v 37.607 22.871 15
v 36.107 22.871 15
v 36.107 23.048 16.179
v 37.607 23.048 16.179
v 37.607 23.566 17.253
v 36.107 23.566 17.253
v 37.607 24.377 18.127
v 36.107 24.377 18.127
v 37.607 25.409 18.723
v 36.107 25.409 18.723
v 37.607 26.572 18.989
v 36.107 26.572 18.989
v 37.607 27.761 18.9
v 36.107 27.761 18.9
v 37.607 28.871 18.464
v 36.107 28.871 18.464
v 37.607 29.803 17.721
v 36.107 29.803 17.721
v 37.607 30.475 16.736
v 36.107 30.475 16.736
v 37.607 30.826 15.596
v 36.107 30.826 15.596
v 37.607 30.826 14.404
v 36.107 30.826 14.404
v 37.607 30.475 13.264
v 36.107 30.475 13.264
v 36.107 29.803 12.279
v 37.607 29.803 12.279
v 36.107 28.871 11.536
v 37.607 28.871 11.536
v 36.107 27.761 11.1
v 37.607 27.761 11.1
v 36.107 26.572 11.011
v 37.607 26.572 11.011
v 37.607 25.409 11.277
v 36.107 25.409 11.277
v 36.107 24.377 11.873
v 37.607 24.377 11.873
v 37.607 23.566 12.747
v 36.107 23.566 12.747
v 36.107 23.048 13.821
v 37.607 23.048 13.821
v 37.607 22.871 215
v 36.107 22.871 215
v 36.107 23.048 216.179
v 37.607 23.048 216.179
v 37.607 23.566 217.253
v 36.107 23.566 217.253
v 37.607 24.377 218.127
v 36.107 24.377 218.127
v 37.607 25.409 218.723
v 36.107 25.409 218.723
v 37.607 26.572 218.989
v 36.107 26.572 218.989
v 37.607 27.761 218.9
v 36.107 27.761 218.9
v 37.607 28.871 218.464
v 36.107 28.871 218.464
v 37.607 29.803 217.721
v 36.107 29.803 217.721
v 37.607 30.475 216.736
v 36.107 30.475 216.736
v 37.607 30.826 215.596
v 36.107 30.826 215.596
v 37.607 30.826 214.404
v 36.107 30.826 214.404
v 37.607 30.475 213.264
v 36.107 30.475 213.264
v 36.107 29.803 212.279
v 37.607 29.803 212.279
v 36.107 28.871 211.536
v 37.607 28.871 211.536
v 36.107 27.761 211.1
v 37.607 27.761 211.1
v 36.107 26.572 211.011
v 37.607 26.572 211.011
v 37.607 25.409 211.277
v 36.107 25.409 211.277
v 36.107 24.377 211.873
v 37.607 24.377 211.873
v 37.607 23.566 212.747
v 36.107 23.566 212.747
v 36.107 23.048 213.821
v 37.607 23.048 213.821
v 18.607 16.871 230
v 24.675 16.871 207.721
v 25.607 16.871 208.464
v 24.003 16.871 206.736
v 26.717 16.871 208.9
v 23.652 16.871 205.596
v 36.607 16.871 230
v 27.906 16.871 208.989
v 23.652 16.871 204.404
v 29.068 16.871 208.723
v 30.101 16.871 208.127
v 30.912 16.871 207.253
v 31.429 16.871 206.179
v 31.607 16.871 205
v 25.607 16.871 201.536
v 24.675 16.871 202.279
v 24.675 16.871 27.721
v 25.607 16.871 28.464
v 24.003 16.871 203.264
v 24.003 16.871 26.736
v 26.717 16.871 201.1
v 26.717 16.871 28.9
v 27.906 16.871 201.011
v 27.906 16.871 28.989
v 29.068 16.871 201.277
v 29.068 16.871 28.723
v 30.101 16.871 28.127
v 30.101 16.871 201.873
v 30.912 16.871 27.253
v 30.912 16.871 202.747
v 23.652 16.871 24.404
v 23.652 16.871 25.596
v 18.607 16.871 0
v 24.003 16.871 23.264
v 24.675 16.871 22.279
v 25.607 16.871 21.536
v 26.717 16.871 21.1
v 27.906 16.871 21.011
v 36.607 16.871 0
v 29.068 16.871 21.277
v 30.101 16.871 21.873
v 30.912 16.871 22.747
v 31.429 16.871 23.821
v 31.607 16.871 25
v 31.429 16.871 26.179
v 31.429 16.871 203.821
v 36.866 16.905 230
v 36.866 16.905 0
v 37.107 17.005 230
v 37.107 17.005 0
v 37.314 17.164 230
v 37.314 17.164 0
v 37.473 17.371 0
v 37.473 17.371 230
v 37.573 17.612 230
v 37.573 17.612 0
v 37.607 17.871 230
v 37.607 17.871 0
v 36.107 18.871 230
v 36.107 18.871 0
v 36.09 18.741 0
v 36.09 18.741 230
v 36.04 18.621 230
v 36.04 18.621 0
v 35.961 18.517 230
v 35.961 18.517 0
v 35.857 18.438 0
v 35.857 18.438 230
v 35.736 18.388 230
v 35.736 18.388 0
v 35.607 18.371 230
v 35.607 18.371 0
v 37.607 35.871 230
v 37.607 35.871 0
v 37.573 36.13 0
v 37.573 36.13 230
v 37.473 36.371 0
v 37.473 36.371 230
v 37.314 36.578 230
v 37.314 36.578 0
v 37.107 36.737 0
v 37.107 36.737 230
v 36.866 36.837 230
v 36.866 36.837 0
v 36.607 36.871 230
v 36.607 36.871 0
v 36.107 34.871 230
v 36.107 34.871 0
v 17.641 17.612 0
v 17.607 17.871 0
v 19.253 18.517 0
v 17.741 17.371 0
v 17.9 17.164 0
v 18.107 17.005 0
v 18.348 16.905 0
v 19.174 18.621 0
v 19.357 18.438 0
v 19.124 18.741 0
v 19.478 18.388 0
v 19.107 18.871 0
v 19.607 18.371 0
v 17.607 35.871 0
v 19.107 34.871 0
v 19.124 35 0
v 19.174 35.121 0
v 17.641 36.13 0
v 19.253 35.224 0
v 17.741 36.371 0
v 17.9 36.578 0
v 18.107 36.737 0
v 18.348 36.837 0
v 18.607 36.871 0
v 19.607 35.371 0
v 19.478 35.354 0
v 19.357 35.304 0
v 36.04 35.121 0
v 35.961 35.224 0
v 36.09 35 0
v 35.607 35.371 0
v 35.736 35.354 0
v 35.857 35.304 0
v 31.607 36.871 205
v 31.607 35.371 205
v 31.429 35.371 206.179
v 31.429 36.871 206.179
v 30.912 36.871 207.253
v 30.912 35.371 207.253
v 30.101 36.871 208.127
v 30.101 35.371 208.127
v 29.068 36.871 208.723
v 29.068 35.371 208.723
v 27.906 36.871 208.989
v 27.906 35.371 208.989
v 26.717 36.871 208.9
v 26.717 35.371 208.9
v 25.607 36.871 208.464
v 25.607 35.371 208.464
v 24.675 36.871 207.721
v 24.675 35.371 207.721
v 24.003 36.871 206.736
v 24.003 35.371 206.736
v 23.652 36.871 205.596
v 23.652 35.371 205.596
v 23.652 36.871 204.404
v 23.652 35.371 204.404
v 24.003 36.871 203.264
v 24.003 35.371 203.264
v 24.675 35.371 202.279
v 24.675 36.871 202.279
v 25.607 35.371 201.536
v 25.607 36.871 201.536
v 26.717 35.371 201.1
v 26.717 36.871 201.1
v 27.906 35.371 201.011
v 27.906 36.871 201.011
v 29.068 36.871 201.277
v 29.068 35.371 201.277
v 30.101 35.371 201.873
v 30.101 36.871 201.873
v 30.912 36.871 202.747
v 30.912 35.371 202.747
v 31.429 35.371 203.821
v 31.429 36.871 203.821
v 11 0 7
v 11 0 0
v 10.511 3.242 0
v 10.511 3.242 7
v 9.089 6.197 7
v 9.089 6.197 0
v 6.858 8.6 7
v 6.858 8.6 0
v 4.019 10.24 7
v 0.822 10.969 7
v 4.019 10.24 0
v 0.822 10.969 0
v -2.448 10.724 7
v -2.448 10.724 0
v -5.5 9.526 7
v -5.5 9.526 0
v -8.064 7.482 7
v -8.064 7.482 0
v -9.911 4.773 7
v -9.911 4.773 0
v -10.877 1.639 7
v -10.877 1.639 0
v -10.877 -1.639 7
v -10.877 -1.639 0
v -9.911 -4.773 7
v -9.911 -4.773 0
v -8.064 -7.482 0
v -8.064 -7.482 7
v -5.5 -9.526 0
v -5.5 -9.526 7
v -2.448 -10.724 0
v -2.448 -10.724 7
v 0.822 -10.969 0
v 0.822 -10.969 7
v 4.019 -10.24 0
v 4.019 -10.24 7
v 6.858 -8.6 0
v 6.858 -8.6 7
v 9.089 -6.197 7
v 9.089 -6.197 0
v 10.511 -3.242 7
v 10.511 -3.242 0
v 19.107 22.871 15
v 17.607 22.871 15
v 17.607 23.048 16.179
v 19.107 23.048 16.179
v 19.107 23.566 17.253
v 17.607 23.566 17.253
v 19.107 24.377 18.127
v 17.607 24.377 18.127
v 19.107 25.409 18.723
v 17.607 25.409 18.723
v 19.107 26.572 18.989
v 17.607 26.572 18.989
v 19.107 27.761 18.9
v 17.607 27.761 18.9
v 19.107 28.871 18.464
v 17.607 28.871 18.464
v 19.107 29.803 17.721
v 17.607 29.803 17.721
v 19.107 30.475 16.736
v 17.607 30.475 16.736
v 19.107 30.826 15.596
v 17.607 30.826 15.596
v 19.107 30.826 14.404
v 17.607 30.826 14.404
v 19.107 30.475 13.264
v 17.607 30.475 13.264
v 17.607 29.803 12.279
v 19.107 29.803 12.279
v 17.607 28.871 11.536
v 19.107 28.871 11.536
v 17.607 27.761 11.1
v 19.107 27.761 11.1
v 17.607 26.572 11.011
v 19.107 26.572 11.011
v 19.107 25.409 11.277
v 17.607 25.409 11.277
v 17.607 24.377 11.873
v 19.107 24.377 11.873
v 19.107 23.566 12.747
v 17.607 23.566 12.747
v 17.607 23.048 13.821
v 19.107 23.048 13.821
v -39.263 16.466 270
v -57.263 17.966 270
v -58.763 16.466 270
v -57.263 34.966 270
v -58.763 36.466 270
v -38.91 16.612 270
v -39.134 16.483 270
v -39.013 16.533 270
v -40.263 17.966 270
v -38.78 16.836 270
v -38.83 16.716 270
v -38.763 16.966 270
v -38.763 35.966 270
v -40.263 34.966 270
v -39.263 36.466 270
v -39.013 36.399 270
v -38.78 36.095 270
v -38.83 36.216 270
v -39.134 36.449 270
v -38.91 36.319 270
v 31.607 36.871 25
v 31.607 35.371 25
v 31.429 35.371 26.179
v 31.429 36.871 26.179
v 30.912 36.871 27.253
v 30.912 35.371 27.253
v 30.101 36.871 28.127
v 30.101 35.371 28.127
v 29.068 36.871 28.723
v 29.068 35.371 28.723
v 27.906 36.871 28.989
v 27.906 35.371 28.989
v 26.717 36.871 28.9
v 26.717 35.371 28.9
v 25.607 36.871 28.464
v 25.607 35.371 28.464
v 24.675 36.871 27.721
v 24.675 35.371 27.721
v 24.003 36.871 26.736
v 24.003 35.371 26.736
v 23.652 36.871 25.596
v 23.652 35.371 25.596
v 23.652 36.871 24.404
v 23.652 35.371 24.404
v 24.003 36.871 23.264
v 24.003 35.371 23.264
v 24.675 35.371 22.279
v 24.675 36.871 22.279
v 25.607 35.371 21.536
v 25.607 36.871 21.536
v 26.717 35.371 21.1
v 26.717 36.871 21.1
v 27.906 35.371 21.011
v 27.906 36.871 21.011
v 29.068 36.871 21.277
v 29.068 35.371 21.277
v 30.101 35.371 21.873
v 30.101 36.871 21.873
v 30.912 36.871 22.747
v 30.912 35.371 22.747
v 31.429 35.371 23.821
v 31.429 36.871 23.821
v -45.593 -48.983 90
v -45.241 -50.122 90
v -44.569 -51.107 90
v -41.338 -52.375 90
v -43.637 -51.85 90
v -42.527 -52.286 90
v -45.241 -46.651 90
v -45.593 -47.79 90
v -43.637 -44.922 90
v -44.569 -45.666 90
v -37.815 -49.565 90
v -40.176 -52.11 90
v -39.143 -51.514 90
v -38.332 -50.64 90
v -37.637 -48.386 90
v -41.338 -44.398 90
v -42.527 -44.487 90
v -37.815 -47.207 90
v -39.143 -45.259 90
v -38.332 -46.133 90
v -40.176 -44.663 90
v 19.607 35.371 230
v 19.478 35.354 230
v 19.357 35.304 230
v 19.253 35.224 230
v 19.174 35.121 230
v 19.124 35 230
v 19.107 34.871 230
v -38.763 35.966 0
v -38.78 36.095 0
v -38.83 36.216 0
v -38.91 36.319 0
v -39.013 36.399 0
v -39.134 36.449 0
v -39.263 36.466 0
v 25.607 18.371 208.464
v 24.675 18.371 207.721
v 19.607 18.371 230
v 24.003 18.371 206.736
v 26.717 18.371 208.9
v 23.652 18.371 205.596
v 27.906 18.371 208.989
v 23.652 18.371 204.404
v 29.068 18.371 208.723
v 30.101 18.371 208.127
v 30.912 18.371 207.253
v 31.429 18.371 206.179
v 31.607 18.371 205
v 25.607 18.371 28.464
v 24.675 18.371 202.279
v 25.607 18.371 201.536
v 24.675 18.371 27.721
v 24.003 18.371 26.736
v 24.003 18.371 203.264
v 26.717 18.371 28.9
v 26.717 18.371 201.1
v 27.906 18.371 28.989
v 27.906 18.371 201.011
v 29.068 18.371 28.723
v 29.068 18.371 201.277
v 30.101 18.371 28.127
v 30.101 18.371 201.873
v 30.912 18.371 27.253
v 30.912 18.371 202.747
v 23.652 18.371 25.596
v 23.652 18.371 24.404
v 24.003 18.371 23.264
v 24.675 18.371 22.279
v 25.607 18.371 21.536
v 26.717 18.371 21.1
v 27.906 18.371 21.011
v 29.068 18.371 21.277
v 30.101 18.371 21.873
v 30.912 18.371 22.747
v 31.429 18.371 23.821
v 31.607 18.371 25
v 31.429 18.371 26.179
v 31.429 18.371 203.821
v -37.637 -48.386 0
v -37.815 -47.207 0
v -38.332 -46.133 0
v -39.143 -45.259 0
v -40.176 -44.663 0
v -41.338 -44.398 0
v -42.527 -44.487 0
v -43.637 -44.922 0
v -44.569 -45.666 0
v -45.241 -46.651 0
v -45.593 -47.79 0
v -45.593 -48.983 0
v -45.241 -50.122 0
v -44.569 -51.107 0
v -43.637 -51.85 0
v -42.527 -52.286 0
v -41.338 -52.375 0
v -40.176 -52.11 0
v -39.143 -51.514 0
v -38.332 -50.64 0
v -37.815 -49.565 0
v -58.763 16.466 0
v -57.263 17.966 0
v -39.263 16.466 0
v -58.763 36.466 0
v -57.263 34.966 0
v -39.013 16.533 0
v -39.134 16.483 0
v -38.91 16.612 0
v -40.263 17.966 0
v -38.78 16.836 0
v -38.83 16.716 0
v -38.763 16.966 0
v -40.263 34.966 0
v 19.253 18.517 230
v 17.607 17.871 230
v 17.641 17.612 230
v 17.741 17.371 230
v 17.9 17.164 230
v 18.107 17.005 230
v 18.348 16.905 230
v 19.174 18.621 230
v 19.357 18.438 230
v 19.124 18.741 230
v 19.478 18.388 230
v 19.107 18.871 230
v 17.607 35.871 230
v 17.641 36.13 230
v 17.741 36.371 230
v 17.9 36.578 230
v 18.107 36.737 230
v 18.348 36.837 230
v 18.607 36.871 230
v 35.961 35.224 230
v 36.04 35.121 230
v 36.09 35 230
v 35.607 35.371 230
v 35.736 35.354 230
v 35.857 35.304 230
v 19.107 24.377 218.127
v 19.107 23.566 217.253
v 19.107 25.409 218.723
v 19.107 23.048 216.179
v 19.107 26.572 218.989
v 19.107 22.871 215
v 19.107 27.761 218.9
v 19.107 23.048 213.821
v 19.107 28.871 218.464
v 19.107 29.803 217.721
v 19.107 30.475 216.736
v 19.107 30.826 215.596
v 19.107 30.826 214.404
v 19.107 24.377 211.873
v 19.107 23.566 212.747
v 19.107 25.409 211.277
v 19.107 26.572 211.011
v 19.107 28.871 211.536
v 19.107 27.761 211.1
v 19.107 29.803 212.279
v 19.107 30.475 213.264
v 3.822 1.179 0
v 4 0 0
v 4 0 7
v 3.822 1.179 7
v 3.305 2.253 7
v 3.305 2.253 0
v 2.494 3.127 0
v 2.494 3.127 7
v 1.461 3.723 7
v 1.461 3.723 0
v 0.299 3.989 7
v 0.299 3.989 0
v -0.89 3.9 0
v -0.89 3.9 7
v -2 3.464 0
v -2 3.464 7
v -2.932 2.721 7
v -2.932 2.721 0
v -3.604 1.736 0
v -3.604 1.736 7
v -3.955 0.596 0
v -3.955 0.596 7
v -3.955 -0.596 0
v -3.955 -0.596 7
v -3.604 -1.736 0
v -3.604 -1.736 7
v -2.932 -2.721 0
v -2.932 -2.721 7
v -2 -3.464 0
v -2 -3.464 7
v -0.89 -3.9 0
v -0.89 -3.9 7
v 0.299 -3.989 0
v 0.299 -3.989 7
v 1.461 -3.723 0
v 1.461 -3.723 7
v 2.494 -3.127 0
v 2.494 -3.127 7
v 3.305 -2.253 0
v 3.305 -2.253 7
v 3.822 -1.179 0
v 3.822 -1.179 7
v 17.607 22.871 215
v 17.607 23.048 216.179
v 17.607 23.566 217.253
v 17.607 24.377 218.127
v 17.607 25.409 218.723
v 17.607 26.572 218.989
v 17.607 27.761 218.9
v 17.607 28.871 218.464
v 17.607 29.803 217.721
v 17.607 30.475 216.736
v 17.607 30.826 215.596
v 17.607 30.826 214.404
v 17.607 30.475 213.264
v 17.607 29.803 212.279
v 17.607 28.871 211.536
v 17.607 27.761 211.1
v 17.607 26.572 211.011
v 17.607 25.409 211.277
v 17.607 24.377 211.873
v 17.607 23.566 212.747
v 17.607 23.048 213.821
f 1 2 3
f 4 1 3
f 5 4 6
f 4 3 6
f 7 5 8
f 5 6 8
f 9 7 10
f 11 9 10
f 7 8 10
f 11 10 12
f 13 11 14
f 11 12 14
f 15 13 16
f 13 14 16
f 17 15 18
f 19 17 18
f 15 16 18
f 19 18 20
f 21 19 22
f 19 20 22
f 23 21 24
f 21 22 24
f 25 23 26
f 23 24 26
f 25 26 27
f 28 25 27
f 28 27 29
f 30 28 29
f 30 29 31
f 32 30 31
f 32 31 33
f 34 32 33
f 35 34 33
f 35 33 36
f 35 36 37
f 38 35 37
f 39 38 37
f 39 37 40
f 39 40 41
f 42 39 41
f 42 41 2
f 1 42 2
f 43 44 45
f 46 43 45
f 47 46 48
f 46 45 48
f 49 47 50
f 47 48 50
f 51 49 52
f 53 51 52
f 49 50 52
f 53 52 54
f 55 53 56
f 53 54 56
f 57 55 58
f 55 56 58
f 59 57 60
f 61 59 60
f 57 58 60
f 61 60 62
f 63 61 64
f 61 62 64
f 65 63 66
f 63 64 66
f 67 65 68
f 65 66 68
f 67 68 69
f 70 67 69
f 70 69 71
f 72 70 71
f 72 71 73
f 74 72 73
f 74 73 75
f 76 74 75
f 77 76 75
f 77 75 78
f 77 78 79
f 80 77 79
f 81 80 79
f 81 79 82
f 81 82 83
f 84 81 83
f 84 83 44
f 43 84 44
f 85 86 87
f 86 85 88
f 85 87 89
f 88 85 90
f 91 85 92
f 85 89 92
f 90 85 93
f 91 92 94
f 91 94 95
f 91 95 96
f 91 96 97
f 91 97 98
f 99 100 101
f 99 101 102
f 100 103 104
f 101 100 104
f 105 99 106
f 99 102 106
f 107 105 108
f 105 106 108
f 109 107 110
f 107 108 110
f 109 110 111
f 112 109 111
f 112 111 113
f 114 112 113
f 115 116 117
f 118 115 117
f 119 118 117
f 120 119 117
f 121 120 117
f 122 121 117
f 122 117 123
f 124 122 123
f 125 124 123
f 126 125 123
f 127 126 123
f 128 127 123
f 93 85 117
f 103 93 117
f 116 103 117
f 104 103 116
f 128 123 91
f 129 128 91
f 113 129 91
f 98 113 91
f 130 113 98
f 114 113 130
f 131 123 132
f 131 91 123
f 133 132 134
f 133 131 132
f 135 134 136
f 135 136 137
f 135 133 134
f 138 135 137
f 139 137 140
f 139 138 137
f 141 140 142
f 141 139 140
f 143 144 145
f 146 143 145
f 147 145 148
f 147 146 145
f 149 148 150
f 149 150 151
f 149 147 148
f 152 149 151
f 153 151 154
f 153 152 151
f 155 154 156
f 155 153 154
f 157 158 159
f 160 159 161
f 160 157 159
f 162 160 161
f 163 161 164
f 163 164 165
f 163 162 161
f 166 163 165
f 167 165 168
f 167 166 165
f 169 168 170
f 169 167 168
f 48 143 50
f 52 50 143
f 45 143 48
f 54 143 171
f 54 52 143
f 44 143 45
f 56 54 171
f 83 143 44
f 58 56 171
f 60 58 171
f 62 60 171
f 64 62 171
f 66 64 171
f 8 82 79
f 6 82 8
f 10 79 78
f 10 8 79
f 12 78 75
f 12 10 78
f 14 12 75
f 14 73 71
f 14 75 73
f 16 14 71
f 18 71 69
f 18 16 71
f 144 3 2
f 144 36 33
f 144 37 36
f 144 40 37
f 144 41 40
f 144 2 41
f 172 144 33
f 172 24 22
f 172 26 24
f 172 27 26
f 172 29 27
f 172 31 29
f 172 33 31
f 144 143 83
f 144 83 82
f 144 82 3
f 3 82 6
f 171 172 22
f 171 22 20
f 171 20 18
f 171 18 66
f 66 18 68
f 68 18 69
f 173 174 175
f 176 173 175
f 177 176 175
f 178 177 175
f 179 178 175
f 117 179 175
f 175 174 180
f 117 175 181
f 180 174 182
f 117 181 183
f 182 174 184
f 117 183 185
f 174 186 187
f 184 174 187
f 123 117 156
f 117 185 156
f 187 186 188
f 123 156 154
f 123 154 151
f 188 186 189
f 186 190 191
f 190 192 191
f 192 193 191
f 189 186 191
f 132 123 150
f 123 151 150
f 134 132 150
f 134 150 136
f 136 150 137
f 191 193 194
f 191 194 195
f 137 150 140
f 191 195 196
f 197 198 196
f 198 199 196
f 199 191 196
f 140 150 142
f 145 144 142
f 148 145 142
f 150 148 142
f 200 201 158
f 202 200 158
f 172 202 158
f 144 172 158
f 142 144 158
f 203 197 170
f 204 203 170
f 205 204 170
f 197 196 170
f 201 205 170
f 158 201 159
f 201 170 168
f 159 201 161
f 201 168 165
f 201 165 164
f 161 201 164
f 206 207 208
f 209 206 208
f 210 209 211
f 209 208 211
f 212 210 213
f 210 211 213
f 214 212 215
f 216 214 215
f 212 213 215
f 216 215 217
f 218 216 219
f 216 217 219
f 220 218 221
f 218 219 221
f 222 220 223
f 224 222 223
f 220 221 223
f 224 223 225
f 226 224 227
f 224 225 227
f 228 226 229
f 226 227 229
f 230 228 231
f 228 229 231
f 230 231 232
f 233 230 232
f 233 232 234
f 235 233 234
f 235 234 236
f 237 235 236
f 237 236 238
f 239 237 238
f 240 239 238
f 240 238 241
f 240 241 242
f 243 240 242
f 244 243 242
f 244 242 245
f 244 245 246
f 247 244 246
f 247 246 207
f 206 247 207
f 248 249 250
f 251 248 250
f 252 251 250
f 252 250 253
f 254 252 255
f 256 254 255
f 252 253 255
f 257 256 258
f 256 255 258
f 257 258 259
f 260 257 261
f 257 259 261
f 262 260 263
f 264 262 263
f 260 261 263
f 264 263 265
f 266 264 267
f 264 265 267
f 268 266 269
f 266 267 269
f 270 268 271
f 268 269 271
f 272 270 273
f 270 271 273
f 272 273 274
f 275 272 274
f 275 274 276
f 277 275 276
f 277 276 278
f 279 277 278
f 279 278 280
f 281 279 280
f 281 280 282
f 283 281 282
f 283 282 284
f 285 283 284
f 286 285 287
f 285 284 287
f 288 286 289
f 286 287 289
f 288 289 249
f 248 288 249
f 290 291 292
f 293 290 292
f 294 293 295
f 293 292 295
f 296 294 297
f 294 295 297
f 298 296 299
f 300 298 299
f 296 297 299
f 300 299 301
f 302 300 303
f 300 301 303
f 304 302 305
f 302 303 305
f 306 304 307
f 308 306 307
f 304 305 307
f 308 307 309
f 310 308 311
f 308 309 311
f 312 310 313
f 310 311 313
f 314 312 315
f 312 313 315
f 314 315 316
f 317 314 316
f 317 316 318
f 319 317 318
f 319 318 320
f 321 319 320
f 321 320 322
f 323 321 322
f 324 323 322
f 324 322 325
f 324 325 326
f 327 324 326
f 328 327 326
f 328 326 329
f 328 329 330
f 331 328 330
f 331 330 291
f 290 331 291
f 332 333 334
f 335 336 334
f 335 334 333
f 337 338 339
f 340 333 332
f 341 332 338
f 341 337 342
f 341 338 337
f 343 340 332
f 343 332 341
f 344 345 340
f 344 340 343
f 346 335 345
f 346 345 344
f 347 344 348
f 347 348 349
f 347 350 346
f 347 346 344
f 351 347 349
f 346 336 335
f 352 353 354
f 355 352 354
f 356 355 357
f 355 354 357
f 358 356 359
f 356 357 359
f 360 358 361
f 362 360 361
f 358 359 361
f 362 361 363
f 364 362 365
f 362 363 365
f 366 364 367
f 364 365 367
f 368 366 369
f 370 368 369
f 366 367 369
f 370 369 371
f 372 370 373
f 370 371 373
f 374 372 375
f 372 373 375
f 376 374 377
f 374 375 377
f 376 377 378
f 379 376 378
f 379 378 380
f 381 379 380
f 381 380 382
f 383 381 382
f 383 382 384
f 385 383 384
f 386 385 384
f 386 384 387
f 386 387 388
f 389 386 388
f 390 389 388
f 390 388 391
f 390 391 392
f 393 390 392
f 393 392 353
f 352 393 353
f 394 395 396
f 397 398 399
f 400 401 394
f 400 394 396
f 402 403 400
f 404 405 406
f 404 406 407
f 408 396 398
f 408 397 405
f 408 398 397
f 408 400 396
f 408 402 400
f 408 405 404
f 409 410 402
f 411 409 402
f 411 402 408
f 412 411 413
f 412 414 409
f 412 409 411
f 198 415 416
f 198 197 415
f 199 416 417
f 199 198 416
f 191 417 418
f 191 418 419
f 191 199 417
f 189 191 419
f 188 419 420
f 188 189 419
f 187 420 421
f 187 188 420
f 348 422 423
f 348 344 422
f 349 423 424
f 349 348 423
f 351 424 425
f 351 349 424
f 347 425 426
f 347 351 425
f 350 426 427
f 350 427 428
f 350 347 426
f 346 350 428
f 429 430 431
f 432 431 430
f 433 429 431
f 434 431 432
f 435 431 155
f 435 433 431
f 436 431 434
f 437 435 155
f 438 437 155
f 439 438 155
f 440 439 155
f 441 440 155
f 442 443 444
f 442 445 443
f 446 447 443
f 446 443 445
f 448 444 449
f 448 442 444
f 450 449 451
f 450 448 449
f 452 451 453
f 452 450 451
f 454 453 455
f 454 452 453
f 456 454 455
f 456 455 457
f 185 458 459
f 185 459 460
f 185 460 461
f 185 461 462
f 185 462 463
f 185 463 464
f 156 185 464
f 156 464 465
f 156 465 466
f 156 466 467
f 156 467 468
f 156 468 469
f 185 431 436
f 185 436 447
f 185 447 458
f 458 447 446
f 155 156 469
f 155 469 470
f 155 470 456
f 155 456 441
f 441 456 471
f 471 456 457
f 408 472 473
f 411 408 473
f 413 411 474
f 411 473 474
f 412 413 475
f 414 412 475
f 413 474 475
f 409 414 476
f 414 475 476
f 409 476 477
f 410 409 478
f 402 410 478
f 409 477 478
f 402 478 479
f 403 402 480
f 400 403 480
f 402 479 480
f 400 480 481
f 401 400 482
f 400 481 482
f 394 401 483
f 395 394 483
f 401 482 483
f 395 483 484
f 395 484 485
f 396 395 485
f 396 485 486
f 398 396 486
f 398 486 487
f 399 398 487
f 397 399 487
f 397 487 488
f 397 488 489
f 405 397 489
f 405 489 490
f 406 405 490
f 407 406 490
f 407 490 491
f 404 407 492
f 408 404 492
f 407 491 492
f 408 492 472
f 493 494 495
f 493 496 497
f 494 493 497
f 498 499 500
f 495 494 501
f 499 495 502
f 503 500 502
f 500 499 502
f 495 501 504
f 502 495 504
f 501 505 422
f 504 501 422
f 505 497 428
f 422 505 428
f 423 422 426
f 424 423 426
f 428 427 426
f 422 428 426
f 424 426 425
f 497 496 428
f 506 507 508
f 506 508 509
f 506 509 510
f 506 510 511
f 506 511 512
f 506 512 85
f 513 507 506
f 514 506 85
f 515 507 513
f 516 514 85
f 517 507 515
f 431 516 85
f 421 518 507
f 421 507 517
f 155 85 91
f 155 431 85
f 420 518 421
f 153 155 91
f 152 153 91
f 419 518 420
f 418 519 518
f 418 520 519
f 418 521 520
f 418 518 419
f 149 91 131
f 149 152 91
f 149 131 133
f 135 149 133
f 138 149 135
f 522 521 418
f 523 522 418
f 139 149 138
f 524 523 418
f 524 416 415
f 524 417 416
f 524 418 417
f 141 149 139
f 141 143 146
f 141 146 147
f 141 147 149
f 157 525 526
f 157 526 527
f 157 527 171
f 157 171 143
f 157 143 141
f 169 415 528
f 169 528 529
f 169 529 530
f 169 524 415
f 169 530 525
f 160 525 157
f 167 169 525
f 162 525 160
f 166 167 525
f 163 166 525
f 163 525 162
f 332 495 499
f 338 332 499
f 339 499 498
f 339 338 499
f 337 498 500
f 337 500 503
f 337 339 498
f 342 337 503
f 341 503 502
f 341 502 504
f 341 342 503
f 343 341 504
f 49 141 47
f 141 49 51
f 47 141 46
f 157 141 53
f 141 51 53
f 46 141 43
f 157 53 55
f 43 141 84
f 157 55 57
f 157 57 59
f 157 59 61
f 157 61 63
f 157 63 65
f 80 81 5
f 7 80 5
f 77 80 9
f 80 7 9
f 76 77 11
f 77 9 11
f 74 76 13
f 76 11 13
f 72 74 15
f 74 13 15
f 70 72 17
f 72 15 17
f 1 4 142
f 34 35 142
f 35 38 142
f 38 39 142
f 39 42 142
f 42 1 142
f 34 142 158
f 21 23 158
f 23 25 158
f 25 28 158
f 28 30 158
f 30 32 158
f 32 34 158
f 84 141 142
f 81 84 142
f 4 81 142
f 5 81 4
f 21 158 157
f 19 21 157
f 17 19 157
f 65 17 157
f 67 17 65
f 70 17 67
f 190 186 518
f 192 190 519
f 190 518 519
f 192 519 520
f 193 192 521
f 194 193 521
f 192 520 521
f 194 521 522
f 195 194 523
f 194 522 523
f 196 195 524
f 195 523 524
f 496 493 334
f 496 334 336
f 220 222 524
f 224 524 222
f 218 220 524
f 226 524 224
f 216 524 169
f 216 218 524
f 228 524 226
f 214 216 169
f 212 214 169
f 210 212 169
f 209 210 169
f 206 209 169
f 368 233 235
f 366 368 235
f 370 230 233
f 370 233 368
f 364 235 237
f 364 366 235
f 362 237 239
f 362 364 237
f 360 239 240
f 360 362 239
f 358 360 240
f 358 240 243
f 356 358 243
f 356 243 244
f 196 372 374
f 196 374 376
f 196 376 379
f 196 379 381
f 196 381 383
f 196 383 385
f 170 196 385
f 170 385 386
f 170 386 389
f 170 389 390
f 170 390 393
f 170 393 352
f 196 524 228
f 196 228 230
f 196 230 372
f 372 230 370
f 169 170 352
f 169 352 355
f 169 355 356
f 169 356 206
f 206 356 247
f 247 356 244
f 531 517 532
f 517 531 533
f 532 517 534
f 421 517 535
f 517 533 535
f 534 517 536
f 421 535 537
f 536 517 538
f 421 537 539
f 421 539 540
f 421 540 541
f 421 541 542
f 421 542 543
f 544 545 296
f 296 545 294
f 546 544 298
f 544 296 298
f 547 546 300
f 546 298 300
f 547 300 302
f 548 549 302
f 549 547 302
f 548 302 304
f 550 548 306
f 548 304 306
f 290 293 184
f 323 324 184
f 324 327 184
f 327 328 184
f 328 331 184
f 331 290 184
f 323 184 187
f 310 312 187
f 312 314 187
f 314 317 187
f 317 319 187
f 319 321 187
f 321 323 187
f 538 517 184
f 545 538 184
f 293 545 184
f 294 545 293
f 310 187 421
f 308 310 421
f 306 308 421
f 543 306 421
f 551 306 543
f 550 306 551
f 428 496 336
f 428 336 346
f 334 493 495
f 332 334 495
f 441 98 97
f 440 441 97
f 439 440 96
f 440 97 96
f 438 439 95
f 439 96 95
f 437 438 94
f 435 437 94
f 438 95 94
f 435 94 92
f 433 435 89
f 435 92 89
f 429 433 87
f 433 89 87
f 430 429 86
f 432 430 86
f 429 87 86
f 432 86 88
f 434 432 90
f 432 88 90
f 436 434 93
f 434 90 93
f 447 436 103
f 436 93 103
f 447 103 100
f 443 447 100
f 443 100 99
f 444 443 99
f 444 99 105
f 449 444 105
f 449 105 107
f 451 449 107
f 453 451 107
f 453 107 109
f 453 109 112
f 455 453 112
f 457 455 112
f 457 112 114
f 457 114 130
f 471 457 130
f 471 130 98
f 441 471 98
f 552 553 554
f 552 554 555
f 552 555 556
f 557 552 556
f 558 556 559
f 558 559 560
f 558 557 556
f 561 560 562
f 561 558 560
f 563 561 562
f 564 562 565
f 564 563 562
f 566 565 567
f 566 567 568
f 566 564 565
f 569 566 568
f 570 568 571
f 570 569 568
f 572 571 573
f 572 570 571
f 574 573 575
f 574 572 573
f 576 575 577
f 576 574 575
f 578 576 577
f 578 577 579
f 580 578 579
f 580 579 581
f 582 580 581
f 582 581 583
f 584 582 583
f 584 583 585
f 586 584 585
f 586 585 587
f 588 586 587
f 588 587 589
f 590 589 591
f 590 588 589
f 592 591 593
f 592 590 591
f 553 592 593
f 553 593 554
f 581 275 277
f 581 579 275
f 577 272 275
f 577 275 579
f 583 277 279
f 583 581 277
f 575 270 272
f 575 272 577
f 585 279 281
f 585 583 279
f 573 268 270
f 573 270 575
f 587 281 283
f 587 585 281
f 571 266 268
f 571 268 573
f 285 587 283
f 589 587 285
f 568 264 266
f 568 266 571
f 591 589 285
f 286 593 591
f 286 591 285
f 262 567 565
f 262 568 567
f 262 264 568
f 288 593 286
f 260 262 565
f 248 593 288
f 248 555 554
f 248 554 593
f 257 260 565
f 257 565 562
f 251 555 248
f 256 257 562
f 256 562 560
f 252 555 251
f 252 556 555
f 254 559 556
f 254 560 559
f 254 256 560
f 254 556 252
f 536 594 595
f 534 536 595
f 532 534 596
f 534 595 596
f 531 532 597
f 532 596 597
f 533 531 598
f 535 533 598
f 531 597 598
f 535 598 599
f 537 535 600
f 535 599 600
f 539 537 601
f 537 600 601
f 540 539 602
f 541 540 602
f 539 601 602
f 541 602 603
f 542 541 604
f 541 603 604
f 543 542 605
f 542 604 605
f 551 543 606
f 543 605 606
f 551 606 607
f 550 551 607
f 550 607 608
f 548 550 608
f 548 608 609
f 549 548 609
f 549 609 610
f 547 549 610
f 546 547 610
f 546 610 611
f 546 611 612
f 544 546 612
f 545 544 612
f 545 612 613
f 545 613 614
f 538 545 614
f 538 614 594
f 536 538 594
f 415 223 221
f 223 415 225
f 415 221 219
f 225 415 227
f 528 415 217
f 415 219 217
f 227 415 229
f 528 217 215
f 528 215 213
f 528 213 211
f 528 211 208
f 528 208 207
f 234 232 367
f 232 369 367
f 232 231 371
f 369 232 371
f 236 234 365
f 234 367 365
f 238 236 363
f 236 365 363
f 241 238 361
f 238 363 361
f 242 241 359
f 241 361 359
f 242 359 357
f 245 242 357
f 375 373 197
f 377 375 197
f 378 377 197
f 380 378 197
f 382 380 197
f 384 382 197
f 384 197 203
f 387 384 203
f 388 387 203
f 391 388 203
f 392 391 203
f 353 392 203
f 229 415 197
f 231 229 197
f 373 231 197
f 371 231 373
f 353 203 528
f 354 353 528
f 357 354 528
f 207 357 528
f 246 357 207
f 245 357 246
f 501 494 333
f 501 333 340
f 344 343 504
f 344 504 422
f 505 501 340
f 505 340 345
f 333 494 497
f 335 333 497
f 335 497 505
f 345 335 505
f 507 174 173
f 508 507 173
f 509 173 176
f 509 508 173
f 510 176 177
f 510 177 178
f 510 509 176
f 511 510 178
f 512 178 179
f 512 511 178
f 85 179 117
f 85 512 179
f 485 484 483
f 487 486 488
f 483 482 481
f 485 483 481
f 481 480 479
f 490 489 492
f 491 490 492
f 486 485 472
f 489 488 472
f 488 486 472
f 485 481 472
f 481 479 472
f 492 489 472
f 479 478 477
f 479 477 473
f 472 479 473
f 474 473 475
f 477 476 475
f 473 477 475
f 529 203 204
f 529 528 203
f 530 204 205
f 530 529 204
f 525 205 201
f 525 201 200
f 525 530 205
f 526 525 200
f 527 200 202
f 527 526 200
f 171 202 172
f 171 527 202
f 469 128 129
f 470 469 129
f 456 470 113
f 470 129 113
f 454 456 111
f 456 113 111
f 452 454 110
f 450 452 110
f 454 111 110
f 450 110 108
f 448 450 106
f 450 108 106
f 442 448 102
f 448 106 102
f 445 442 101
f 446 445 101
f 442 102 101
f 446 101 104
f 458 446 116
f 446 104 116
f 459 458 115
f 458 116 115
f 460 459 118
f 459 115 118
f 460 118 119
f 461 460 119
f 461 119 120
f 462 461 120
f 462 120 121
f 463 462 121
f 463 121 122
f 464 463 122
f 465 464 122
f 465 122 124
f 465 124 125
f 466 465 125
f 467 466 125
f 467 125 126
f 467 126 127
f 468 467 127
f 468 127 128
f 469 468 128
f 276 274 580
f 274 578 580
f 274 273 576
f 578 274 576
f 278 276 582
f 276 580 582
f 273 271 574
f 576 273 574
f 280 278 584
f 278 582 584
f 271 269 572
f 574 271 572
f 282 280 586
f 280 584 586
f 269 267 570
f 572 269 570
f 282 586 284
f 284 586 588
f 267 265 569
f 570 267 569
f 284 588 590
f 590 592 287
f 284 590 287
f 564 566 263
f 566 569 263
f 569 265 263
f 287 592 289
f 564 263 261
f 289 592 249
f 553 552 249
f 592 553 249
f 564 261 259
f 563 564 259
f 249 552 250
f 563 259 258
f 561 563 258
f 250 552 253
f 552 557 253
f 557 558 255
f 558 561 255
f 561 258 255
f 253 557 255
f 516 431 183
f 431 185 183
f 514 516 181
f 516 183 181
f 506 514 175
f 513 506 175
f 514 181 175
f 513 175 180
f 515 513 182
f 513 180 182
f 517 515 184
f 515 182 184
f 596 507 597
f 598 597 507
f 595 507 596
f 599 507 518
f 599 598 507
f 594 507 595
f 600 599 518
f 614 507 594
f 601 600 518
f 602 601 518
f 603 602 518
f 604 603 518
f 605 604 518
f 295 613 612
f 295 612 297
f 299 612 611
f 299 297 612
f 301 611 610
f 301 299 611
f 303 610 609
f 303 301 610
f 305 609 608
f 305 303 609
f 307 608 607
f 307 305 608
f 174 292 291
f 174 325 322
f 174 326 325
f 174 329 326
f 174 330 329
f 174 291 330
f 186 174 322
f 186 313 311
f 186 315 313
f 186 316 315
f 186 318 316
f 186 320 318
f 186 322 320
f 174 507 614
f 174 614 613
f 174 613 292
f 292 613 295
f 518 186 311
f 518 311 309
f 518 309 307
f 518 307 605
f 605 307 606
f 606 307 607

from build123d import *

# Parameters (mm, degrees)
F1_R      = 11
F1_R_2    = 4
F2_DEPTH  = 7
F3_W      = 20
F3_H      = 20
F4_DEPTH  = 270
F5_R      = 0.5
F6_T      = -1.5
F7_W      = 20
F7_H      = 20
F8_DEPTH  = 230
F9_R      = 1
F10_T     = -1.5
F12_D     = 8
F14_D     = 8
F15_R     = 4
F16_DEPTH = 90
F17_R     = 0.5


with BuildPart() as f2:
    # F1 (on Top) → F2 (new body)
    with BuildSketch(Plane.XY):
        Circle(F1_R)
        Circle(F1_R_2, mode=Mode.SUBTRACT)
    extrude(amount=F2_DEPTH)


with BuildPart() as f4:
    # F3 (on Top) → F4 (new body)
    with BuildSketch(Plane.XY):
        with Locations((-48.7633477896, 26.4656734091)):
            Rectangle(F3_W, F3_H)
    extrude(amount=F4_DEPTH)

    # F5
    f5_edges = [f4.edges().sort_by_distance(p)[0] for p in [
        (-38.763348, 36.465673, 135),
        (-38.763348, 16.465673, 135),
    ]]
    fillet(f5_edges, radius=F5_R)

    # F6
    f6_openings = [f4.faces().sort_by_distance(p)[0] for p in [
        (-48.766001, 26.465673, 270),
        (-48.766001, 26.465673, 0),
    ]]
    offset(amount=F6_T, openings=f6_openings)


with BuildPart() as f8:
    # F7 (on Top) → F8 (new body)
    with BuildSketch(Plane.XY):
        with Locations((27.6069855317, 26.8707028835)):
            Rectangle(F7_W, F7_H)
    extrude(amount=F8_DEPTH)

    # F9
    f9_edges = [f8.edges().sort_by_distance(p)[0] for p in [
        (37.606986, 36.870703, 115),
        (17.606986, 36.870703, 115),
        (37.606986, 16.870703, 115),
        (17.606986, 16.870703, 115),
    ]]
    fillet(f9_edges, radius=F9_R)

    # F10
    f10_openings = [f8.faces().sort_by_distance(p)[0] for p in [
        (27.606986, 26.870703, 230),
        (27.606986, 26.870703, 0),
    ]]
    offset(amount=F10_T, openings=f10_openings)

    # F12 (through all)
    with Locations(Plane.YZ.offset(37.6069855317)):
        with Locations((26.8707028835, 15), (26.8707028835, 215)):
            Hole(F12_D / 2)

    # F14 (through all)
    with Locations(Plane(origin=(0, 36.8707028835, 0), x_dir=(-1, 0, 0), z_dir=(0, 1, 0))):
        with Locations((-27.6069855317, 205), (-27.6069855317, 25)):
            Hole(F14_D / 2)

    # F17
    f17_edges = [f8.edges().sort_by_distance(p)[0] for p in [
        (36.106986, 35.370703, 115),
        (19.106986, 35.370703, 115),
        (36.106986, 18.370703, 115),
        (19.106986, 18.370703, 115),
    ]]
    fillet(f17_edges, radius=F17_R)


with BuildPart() as f16:
    # F15 (on Top) → F16 (new body)
    with BuildSketch(Plane.XY):
        with Locations((-41.6371822357, -48.3863502741)):
            Circle(F15_R)
    extrude(amount=F16_DEPTH)


solid = Compound([f2.part, f4.part, f8.part, f16.part])
